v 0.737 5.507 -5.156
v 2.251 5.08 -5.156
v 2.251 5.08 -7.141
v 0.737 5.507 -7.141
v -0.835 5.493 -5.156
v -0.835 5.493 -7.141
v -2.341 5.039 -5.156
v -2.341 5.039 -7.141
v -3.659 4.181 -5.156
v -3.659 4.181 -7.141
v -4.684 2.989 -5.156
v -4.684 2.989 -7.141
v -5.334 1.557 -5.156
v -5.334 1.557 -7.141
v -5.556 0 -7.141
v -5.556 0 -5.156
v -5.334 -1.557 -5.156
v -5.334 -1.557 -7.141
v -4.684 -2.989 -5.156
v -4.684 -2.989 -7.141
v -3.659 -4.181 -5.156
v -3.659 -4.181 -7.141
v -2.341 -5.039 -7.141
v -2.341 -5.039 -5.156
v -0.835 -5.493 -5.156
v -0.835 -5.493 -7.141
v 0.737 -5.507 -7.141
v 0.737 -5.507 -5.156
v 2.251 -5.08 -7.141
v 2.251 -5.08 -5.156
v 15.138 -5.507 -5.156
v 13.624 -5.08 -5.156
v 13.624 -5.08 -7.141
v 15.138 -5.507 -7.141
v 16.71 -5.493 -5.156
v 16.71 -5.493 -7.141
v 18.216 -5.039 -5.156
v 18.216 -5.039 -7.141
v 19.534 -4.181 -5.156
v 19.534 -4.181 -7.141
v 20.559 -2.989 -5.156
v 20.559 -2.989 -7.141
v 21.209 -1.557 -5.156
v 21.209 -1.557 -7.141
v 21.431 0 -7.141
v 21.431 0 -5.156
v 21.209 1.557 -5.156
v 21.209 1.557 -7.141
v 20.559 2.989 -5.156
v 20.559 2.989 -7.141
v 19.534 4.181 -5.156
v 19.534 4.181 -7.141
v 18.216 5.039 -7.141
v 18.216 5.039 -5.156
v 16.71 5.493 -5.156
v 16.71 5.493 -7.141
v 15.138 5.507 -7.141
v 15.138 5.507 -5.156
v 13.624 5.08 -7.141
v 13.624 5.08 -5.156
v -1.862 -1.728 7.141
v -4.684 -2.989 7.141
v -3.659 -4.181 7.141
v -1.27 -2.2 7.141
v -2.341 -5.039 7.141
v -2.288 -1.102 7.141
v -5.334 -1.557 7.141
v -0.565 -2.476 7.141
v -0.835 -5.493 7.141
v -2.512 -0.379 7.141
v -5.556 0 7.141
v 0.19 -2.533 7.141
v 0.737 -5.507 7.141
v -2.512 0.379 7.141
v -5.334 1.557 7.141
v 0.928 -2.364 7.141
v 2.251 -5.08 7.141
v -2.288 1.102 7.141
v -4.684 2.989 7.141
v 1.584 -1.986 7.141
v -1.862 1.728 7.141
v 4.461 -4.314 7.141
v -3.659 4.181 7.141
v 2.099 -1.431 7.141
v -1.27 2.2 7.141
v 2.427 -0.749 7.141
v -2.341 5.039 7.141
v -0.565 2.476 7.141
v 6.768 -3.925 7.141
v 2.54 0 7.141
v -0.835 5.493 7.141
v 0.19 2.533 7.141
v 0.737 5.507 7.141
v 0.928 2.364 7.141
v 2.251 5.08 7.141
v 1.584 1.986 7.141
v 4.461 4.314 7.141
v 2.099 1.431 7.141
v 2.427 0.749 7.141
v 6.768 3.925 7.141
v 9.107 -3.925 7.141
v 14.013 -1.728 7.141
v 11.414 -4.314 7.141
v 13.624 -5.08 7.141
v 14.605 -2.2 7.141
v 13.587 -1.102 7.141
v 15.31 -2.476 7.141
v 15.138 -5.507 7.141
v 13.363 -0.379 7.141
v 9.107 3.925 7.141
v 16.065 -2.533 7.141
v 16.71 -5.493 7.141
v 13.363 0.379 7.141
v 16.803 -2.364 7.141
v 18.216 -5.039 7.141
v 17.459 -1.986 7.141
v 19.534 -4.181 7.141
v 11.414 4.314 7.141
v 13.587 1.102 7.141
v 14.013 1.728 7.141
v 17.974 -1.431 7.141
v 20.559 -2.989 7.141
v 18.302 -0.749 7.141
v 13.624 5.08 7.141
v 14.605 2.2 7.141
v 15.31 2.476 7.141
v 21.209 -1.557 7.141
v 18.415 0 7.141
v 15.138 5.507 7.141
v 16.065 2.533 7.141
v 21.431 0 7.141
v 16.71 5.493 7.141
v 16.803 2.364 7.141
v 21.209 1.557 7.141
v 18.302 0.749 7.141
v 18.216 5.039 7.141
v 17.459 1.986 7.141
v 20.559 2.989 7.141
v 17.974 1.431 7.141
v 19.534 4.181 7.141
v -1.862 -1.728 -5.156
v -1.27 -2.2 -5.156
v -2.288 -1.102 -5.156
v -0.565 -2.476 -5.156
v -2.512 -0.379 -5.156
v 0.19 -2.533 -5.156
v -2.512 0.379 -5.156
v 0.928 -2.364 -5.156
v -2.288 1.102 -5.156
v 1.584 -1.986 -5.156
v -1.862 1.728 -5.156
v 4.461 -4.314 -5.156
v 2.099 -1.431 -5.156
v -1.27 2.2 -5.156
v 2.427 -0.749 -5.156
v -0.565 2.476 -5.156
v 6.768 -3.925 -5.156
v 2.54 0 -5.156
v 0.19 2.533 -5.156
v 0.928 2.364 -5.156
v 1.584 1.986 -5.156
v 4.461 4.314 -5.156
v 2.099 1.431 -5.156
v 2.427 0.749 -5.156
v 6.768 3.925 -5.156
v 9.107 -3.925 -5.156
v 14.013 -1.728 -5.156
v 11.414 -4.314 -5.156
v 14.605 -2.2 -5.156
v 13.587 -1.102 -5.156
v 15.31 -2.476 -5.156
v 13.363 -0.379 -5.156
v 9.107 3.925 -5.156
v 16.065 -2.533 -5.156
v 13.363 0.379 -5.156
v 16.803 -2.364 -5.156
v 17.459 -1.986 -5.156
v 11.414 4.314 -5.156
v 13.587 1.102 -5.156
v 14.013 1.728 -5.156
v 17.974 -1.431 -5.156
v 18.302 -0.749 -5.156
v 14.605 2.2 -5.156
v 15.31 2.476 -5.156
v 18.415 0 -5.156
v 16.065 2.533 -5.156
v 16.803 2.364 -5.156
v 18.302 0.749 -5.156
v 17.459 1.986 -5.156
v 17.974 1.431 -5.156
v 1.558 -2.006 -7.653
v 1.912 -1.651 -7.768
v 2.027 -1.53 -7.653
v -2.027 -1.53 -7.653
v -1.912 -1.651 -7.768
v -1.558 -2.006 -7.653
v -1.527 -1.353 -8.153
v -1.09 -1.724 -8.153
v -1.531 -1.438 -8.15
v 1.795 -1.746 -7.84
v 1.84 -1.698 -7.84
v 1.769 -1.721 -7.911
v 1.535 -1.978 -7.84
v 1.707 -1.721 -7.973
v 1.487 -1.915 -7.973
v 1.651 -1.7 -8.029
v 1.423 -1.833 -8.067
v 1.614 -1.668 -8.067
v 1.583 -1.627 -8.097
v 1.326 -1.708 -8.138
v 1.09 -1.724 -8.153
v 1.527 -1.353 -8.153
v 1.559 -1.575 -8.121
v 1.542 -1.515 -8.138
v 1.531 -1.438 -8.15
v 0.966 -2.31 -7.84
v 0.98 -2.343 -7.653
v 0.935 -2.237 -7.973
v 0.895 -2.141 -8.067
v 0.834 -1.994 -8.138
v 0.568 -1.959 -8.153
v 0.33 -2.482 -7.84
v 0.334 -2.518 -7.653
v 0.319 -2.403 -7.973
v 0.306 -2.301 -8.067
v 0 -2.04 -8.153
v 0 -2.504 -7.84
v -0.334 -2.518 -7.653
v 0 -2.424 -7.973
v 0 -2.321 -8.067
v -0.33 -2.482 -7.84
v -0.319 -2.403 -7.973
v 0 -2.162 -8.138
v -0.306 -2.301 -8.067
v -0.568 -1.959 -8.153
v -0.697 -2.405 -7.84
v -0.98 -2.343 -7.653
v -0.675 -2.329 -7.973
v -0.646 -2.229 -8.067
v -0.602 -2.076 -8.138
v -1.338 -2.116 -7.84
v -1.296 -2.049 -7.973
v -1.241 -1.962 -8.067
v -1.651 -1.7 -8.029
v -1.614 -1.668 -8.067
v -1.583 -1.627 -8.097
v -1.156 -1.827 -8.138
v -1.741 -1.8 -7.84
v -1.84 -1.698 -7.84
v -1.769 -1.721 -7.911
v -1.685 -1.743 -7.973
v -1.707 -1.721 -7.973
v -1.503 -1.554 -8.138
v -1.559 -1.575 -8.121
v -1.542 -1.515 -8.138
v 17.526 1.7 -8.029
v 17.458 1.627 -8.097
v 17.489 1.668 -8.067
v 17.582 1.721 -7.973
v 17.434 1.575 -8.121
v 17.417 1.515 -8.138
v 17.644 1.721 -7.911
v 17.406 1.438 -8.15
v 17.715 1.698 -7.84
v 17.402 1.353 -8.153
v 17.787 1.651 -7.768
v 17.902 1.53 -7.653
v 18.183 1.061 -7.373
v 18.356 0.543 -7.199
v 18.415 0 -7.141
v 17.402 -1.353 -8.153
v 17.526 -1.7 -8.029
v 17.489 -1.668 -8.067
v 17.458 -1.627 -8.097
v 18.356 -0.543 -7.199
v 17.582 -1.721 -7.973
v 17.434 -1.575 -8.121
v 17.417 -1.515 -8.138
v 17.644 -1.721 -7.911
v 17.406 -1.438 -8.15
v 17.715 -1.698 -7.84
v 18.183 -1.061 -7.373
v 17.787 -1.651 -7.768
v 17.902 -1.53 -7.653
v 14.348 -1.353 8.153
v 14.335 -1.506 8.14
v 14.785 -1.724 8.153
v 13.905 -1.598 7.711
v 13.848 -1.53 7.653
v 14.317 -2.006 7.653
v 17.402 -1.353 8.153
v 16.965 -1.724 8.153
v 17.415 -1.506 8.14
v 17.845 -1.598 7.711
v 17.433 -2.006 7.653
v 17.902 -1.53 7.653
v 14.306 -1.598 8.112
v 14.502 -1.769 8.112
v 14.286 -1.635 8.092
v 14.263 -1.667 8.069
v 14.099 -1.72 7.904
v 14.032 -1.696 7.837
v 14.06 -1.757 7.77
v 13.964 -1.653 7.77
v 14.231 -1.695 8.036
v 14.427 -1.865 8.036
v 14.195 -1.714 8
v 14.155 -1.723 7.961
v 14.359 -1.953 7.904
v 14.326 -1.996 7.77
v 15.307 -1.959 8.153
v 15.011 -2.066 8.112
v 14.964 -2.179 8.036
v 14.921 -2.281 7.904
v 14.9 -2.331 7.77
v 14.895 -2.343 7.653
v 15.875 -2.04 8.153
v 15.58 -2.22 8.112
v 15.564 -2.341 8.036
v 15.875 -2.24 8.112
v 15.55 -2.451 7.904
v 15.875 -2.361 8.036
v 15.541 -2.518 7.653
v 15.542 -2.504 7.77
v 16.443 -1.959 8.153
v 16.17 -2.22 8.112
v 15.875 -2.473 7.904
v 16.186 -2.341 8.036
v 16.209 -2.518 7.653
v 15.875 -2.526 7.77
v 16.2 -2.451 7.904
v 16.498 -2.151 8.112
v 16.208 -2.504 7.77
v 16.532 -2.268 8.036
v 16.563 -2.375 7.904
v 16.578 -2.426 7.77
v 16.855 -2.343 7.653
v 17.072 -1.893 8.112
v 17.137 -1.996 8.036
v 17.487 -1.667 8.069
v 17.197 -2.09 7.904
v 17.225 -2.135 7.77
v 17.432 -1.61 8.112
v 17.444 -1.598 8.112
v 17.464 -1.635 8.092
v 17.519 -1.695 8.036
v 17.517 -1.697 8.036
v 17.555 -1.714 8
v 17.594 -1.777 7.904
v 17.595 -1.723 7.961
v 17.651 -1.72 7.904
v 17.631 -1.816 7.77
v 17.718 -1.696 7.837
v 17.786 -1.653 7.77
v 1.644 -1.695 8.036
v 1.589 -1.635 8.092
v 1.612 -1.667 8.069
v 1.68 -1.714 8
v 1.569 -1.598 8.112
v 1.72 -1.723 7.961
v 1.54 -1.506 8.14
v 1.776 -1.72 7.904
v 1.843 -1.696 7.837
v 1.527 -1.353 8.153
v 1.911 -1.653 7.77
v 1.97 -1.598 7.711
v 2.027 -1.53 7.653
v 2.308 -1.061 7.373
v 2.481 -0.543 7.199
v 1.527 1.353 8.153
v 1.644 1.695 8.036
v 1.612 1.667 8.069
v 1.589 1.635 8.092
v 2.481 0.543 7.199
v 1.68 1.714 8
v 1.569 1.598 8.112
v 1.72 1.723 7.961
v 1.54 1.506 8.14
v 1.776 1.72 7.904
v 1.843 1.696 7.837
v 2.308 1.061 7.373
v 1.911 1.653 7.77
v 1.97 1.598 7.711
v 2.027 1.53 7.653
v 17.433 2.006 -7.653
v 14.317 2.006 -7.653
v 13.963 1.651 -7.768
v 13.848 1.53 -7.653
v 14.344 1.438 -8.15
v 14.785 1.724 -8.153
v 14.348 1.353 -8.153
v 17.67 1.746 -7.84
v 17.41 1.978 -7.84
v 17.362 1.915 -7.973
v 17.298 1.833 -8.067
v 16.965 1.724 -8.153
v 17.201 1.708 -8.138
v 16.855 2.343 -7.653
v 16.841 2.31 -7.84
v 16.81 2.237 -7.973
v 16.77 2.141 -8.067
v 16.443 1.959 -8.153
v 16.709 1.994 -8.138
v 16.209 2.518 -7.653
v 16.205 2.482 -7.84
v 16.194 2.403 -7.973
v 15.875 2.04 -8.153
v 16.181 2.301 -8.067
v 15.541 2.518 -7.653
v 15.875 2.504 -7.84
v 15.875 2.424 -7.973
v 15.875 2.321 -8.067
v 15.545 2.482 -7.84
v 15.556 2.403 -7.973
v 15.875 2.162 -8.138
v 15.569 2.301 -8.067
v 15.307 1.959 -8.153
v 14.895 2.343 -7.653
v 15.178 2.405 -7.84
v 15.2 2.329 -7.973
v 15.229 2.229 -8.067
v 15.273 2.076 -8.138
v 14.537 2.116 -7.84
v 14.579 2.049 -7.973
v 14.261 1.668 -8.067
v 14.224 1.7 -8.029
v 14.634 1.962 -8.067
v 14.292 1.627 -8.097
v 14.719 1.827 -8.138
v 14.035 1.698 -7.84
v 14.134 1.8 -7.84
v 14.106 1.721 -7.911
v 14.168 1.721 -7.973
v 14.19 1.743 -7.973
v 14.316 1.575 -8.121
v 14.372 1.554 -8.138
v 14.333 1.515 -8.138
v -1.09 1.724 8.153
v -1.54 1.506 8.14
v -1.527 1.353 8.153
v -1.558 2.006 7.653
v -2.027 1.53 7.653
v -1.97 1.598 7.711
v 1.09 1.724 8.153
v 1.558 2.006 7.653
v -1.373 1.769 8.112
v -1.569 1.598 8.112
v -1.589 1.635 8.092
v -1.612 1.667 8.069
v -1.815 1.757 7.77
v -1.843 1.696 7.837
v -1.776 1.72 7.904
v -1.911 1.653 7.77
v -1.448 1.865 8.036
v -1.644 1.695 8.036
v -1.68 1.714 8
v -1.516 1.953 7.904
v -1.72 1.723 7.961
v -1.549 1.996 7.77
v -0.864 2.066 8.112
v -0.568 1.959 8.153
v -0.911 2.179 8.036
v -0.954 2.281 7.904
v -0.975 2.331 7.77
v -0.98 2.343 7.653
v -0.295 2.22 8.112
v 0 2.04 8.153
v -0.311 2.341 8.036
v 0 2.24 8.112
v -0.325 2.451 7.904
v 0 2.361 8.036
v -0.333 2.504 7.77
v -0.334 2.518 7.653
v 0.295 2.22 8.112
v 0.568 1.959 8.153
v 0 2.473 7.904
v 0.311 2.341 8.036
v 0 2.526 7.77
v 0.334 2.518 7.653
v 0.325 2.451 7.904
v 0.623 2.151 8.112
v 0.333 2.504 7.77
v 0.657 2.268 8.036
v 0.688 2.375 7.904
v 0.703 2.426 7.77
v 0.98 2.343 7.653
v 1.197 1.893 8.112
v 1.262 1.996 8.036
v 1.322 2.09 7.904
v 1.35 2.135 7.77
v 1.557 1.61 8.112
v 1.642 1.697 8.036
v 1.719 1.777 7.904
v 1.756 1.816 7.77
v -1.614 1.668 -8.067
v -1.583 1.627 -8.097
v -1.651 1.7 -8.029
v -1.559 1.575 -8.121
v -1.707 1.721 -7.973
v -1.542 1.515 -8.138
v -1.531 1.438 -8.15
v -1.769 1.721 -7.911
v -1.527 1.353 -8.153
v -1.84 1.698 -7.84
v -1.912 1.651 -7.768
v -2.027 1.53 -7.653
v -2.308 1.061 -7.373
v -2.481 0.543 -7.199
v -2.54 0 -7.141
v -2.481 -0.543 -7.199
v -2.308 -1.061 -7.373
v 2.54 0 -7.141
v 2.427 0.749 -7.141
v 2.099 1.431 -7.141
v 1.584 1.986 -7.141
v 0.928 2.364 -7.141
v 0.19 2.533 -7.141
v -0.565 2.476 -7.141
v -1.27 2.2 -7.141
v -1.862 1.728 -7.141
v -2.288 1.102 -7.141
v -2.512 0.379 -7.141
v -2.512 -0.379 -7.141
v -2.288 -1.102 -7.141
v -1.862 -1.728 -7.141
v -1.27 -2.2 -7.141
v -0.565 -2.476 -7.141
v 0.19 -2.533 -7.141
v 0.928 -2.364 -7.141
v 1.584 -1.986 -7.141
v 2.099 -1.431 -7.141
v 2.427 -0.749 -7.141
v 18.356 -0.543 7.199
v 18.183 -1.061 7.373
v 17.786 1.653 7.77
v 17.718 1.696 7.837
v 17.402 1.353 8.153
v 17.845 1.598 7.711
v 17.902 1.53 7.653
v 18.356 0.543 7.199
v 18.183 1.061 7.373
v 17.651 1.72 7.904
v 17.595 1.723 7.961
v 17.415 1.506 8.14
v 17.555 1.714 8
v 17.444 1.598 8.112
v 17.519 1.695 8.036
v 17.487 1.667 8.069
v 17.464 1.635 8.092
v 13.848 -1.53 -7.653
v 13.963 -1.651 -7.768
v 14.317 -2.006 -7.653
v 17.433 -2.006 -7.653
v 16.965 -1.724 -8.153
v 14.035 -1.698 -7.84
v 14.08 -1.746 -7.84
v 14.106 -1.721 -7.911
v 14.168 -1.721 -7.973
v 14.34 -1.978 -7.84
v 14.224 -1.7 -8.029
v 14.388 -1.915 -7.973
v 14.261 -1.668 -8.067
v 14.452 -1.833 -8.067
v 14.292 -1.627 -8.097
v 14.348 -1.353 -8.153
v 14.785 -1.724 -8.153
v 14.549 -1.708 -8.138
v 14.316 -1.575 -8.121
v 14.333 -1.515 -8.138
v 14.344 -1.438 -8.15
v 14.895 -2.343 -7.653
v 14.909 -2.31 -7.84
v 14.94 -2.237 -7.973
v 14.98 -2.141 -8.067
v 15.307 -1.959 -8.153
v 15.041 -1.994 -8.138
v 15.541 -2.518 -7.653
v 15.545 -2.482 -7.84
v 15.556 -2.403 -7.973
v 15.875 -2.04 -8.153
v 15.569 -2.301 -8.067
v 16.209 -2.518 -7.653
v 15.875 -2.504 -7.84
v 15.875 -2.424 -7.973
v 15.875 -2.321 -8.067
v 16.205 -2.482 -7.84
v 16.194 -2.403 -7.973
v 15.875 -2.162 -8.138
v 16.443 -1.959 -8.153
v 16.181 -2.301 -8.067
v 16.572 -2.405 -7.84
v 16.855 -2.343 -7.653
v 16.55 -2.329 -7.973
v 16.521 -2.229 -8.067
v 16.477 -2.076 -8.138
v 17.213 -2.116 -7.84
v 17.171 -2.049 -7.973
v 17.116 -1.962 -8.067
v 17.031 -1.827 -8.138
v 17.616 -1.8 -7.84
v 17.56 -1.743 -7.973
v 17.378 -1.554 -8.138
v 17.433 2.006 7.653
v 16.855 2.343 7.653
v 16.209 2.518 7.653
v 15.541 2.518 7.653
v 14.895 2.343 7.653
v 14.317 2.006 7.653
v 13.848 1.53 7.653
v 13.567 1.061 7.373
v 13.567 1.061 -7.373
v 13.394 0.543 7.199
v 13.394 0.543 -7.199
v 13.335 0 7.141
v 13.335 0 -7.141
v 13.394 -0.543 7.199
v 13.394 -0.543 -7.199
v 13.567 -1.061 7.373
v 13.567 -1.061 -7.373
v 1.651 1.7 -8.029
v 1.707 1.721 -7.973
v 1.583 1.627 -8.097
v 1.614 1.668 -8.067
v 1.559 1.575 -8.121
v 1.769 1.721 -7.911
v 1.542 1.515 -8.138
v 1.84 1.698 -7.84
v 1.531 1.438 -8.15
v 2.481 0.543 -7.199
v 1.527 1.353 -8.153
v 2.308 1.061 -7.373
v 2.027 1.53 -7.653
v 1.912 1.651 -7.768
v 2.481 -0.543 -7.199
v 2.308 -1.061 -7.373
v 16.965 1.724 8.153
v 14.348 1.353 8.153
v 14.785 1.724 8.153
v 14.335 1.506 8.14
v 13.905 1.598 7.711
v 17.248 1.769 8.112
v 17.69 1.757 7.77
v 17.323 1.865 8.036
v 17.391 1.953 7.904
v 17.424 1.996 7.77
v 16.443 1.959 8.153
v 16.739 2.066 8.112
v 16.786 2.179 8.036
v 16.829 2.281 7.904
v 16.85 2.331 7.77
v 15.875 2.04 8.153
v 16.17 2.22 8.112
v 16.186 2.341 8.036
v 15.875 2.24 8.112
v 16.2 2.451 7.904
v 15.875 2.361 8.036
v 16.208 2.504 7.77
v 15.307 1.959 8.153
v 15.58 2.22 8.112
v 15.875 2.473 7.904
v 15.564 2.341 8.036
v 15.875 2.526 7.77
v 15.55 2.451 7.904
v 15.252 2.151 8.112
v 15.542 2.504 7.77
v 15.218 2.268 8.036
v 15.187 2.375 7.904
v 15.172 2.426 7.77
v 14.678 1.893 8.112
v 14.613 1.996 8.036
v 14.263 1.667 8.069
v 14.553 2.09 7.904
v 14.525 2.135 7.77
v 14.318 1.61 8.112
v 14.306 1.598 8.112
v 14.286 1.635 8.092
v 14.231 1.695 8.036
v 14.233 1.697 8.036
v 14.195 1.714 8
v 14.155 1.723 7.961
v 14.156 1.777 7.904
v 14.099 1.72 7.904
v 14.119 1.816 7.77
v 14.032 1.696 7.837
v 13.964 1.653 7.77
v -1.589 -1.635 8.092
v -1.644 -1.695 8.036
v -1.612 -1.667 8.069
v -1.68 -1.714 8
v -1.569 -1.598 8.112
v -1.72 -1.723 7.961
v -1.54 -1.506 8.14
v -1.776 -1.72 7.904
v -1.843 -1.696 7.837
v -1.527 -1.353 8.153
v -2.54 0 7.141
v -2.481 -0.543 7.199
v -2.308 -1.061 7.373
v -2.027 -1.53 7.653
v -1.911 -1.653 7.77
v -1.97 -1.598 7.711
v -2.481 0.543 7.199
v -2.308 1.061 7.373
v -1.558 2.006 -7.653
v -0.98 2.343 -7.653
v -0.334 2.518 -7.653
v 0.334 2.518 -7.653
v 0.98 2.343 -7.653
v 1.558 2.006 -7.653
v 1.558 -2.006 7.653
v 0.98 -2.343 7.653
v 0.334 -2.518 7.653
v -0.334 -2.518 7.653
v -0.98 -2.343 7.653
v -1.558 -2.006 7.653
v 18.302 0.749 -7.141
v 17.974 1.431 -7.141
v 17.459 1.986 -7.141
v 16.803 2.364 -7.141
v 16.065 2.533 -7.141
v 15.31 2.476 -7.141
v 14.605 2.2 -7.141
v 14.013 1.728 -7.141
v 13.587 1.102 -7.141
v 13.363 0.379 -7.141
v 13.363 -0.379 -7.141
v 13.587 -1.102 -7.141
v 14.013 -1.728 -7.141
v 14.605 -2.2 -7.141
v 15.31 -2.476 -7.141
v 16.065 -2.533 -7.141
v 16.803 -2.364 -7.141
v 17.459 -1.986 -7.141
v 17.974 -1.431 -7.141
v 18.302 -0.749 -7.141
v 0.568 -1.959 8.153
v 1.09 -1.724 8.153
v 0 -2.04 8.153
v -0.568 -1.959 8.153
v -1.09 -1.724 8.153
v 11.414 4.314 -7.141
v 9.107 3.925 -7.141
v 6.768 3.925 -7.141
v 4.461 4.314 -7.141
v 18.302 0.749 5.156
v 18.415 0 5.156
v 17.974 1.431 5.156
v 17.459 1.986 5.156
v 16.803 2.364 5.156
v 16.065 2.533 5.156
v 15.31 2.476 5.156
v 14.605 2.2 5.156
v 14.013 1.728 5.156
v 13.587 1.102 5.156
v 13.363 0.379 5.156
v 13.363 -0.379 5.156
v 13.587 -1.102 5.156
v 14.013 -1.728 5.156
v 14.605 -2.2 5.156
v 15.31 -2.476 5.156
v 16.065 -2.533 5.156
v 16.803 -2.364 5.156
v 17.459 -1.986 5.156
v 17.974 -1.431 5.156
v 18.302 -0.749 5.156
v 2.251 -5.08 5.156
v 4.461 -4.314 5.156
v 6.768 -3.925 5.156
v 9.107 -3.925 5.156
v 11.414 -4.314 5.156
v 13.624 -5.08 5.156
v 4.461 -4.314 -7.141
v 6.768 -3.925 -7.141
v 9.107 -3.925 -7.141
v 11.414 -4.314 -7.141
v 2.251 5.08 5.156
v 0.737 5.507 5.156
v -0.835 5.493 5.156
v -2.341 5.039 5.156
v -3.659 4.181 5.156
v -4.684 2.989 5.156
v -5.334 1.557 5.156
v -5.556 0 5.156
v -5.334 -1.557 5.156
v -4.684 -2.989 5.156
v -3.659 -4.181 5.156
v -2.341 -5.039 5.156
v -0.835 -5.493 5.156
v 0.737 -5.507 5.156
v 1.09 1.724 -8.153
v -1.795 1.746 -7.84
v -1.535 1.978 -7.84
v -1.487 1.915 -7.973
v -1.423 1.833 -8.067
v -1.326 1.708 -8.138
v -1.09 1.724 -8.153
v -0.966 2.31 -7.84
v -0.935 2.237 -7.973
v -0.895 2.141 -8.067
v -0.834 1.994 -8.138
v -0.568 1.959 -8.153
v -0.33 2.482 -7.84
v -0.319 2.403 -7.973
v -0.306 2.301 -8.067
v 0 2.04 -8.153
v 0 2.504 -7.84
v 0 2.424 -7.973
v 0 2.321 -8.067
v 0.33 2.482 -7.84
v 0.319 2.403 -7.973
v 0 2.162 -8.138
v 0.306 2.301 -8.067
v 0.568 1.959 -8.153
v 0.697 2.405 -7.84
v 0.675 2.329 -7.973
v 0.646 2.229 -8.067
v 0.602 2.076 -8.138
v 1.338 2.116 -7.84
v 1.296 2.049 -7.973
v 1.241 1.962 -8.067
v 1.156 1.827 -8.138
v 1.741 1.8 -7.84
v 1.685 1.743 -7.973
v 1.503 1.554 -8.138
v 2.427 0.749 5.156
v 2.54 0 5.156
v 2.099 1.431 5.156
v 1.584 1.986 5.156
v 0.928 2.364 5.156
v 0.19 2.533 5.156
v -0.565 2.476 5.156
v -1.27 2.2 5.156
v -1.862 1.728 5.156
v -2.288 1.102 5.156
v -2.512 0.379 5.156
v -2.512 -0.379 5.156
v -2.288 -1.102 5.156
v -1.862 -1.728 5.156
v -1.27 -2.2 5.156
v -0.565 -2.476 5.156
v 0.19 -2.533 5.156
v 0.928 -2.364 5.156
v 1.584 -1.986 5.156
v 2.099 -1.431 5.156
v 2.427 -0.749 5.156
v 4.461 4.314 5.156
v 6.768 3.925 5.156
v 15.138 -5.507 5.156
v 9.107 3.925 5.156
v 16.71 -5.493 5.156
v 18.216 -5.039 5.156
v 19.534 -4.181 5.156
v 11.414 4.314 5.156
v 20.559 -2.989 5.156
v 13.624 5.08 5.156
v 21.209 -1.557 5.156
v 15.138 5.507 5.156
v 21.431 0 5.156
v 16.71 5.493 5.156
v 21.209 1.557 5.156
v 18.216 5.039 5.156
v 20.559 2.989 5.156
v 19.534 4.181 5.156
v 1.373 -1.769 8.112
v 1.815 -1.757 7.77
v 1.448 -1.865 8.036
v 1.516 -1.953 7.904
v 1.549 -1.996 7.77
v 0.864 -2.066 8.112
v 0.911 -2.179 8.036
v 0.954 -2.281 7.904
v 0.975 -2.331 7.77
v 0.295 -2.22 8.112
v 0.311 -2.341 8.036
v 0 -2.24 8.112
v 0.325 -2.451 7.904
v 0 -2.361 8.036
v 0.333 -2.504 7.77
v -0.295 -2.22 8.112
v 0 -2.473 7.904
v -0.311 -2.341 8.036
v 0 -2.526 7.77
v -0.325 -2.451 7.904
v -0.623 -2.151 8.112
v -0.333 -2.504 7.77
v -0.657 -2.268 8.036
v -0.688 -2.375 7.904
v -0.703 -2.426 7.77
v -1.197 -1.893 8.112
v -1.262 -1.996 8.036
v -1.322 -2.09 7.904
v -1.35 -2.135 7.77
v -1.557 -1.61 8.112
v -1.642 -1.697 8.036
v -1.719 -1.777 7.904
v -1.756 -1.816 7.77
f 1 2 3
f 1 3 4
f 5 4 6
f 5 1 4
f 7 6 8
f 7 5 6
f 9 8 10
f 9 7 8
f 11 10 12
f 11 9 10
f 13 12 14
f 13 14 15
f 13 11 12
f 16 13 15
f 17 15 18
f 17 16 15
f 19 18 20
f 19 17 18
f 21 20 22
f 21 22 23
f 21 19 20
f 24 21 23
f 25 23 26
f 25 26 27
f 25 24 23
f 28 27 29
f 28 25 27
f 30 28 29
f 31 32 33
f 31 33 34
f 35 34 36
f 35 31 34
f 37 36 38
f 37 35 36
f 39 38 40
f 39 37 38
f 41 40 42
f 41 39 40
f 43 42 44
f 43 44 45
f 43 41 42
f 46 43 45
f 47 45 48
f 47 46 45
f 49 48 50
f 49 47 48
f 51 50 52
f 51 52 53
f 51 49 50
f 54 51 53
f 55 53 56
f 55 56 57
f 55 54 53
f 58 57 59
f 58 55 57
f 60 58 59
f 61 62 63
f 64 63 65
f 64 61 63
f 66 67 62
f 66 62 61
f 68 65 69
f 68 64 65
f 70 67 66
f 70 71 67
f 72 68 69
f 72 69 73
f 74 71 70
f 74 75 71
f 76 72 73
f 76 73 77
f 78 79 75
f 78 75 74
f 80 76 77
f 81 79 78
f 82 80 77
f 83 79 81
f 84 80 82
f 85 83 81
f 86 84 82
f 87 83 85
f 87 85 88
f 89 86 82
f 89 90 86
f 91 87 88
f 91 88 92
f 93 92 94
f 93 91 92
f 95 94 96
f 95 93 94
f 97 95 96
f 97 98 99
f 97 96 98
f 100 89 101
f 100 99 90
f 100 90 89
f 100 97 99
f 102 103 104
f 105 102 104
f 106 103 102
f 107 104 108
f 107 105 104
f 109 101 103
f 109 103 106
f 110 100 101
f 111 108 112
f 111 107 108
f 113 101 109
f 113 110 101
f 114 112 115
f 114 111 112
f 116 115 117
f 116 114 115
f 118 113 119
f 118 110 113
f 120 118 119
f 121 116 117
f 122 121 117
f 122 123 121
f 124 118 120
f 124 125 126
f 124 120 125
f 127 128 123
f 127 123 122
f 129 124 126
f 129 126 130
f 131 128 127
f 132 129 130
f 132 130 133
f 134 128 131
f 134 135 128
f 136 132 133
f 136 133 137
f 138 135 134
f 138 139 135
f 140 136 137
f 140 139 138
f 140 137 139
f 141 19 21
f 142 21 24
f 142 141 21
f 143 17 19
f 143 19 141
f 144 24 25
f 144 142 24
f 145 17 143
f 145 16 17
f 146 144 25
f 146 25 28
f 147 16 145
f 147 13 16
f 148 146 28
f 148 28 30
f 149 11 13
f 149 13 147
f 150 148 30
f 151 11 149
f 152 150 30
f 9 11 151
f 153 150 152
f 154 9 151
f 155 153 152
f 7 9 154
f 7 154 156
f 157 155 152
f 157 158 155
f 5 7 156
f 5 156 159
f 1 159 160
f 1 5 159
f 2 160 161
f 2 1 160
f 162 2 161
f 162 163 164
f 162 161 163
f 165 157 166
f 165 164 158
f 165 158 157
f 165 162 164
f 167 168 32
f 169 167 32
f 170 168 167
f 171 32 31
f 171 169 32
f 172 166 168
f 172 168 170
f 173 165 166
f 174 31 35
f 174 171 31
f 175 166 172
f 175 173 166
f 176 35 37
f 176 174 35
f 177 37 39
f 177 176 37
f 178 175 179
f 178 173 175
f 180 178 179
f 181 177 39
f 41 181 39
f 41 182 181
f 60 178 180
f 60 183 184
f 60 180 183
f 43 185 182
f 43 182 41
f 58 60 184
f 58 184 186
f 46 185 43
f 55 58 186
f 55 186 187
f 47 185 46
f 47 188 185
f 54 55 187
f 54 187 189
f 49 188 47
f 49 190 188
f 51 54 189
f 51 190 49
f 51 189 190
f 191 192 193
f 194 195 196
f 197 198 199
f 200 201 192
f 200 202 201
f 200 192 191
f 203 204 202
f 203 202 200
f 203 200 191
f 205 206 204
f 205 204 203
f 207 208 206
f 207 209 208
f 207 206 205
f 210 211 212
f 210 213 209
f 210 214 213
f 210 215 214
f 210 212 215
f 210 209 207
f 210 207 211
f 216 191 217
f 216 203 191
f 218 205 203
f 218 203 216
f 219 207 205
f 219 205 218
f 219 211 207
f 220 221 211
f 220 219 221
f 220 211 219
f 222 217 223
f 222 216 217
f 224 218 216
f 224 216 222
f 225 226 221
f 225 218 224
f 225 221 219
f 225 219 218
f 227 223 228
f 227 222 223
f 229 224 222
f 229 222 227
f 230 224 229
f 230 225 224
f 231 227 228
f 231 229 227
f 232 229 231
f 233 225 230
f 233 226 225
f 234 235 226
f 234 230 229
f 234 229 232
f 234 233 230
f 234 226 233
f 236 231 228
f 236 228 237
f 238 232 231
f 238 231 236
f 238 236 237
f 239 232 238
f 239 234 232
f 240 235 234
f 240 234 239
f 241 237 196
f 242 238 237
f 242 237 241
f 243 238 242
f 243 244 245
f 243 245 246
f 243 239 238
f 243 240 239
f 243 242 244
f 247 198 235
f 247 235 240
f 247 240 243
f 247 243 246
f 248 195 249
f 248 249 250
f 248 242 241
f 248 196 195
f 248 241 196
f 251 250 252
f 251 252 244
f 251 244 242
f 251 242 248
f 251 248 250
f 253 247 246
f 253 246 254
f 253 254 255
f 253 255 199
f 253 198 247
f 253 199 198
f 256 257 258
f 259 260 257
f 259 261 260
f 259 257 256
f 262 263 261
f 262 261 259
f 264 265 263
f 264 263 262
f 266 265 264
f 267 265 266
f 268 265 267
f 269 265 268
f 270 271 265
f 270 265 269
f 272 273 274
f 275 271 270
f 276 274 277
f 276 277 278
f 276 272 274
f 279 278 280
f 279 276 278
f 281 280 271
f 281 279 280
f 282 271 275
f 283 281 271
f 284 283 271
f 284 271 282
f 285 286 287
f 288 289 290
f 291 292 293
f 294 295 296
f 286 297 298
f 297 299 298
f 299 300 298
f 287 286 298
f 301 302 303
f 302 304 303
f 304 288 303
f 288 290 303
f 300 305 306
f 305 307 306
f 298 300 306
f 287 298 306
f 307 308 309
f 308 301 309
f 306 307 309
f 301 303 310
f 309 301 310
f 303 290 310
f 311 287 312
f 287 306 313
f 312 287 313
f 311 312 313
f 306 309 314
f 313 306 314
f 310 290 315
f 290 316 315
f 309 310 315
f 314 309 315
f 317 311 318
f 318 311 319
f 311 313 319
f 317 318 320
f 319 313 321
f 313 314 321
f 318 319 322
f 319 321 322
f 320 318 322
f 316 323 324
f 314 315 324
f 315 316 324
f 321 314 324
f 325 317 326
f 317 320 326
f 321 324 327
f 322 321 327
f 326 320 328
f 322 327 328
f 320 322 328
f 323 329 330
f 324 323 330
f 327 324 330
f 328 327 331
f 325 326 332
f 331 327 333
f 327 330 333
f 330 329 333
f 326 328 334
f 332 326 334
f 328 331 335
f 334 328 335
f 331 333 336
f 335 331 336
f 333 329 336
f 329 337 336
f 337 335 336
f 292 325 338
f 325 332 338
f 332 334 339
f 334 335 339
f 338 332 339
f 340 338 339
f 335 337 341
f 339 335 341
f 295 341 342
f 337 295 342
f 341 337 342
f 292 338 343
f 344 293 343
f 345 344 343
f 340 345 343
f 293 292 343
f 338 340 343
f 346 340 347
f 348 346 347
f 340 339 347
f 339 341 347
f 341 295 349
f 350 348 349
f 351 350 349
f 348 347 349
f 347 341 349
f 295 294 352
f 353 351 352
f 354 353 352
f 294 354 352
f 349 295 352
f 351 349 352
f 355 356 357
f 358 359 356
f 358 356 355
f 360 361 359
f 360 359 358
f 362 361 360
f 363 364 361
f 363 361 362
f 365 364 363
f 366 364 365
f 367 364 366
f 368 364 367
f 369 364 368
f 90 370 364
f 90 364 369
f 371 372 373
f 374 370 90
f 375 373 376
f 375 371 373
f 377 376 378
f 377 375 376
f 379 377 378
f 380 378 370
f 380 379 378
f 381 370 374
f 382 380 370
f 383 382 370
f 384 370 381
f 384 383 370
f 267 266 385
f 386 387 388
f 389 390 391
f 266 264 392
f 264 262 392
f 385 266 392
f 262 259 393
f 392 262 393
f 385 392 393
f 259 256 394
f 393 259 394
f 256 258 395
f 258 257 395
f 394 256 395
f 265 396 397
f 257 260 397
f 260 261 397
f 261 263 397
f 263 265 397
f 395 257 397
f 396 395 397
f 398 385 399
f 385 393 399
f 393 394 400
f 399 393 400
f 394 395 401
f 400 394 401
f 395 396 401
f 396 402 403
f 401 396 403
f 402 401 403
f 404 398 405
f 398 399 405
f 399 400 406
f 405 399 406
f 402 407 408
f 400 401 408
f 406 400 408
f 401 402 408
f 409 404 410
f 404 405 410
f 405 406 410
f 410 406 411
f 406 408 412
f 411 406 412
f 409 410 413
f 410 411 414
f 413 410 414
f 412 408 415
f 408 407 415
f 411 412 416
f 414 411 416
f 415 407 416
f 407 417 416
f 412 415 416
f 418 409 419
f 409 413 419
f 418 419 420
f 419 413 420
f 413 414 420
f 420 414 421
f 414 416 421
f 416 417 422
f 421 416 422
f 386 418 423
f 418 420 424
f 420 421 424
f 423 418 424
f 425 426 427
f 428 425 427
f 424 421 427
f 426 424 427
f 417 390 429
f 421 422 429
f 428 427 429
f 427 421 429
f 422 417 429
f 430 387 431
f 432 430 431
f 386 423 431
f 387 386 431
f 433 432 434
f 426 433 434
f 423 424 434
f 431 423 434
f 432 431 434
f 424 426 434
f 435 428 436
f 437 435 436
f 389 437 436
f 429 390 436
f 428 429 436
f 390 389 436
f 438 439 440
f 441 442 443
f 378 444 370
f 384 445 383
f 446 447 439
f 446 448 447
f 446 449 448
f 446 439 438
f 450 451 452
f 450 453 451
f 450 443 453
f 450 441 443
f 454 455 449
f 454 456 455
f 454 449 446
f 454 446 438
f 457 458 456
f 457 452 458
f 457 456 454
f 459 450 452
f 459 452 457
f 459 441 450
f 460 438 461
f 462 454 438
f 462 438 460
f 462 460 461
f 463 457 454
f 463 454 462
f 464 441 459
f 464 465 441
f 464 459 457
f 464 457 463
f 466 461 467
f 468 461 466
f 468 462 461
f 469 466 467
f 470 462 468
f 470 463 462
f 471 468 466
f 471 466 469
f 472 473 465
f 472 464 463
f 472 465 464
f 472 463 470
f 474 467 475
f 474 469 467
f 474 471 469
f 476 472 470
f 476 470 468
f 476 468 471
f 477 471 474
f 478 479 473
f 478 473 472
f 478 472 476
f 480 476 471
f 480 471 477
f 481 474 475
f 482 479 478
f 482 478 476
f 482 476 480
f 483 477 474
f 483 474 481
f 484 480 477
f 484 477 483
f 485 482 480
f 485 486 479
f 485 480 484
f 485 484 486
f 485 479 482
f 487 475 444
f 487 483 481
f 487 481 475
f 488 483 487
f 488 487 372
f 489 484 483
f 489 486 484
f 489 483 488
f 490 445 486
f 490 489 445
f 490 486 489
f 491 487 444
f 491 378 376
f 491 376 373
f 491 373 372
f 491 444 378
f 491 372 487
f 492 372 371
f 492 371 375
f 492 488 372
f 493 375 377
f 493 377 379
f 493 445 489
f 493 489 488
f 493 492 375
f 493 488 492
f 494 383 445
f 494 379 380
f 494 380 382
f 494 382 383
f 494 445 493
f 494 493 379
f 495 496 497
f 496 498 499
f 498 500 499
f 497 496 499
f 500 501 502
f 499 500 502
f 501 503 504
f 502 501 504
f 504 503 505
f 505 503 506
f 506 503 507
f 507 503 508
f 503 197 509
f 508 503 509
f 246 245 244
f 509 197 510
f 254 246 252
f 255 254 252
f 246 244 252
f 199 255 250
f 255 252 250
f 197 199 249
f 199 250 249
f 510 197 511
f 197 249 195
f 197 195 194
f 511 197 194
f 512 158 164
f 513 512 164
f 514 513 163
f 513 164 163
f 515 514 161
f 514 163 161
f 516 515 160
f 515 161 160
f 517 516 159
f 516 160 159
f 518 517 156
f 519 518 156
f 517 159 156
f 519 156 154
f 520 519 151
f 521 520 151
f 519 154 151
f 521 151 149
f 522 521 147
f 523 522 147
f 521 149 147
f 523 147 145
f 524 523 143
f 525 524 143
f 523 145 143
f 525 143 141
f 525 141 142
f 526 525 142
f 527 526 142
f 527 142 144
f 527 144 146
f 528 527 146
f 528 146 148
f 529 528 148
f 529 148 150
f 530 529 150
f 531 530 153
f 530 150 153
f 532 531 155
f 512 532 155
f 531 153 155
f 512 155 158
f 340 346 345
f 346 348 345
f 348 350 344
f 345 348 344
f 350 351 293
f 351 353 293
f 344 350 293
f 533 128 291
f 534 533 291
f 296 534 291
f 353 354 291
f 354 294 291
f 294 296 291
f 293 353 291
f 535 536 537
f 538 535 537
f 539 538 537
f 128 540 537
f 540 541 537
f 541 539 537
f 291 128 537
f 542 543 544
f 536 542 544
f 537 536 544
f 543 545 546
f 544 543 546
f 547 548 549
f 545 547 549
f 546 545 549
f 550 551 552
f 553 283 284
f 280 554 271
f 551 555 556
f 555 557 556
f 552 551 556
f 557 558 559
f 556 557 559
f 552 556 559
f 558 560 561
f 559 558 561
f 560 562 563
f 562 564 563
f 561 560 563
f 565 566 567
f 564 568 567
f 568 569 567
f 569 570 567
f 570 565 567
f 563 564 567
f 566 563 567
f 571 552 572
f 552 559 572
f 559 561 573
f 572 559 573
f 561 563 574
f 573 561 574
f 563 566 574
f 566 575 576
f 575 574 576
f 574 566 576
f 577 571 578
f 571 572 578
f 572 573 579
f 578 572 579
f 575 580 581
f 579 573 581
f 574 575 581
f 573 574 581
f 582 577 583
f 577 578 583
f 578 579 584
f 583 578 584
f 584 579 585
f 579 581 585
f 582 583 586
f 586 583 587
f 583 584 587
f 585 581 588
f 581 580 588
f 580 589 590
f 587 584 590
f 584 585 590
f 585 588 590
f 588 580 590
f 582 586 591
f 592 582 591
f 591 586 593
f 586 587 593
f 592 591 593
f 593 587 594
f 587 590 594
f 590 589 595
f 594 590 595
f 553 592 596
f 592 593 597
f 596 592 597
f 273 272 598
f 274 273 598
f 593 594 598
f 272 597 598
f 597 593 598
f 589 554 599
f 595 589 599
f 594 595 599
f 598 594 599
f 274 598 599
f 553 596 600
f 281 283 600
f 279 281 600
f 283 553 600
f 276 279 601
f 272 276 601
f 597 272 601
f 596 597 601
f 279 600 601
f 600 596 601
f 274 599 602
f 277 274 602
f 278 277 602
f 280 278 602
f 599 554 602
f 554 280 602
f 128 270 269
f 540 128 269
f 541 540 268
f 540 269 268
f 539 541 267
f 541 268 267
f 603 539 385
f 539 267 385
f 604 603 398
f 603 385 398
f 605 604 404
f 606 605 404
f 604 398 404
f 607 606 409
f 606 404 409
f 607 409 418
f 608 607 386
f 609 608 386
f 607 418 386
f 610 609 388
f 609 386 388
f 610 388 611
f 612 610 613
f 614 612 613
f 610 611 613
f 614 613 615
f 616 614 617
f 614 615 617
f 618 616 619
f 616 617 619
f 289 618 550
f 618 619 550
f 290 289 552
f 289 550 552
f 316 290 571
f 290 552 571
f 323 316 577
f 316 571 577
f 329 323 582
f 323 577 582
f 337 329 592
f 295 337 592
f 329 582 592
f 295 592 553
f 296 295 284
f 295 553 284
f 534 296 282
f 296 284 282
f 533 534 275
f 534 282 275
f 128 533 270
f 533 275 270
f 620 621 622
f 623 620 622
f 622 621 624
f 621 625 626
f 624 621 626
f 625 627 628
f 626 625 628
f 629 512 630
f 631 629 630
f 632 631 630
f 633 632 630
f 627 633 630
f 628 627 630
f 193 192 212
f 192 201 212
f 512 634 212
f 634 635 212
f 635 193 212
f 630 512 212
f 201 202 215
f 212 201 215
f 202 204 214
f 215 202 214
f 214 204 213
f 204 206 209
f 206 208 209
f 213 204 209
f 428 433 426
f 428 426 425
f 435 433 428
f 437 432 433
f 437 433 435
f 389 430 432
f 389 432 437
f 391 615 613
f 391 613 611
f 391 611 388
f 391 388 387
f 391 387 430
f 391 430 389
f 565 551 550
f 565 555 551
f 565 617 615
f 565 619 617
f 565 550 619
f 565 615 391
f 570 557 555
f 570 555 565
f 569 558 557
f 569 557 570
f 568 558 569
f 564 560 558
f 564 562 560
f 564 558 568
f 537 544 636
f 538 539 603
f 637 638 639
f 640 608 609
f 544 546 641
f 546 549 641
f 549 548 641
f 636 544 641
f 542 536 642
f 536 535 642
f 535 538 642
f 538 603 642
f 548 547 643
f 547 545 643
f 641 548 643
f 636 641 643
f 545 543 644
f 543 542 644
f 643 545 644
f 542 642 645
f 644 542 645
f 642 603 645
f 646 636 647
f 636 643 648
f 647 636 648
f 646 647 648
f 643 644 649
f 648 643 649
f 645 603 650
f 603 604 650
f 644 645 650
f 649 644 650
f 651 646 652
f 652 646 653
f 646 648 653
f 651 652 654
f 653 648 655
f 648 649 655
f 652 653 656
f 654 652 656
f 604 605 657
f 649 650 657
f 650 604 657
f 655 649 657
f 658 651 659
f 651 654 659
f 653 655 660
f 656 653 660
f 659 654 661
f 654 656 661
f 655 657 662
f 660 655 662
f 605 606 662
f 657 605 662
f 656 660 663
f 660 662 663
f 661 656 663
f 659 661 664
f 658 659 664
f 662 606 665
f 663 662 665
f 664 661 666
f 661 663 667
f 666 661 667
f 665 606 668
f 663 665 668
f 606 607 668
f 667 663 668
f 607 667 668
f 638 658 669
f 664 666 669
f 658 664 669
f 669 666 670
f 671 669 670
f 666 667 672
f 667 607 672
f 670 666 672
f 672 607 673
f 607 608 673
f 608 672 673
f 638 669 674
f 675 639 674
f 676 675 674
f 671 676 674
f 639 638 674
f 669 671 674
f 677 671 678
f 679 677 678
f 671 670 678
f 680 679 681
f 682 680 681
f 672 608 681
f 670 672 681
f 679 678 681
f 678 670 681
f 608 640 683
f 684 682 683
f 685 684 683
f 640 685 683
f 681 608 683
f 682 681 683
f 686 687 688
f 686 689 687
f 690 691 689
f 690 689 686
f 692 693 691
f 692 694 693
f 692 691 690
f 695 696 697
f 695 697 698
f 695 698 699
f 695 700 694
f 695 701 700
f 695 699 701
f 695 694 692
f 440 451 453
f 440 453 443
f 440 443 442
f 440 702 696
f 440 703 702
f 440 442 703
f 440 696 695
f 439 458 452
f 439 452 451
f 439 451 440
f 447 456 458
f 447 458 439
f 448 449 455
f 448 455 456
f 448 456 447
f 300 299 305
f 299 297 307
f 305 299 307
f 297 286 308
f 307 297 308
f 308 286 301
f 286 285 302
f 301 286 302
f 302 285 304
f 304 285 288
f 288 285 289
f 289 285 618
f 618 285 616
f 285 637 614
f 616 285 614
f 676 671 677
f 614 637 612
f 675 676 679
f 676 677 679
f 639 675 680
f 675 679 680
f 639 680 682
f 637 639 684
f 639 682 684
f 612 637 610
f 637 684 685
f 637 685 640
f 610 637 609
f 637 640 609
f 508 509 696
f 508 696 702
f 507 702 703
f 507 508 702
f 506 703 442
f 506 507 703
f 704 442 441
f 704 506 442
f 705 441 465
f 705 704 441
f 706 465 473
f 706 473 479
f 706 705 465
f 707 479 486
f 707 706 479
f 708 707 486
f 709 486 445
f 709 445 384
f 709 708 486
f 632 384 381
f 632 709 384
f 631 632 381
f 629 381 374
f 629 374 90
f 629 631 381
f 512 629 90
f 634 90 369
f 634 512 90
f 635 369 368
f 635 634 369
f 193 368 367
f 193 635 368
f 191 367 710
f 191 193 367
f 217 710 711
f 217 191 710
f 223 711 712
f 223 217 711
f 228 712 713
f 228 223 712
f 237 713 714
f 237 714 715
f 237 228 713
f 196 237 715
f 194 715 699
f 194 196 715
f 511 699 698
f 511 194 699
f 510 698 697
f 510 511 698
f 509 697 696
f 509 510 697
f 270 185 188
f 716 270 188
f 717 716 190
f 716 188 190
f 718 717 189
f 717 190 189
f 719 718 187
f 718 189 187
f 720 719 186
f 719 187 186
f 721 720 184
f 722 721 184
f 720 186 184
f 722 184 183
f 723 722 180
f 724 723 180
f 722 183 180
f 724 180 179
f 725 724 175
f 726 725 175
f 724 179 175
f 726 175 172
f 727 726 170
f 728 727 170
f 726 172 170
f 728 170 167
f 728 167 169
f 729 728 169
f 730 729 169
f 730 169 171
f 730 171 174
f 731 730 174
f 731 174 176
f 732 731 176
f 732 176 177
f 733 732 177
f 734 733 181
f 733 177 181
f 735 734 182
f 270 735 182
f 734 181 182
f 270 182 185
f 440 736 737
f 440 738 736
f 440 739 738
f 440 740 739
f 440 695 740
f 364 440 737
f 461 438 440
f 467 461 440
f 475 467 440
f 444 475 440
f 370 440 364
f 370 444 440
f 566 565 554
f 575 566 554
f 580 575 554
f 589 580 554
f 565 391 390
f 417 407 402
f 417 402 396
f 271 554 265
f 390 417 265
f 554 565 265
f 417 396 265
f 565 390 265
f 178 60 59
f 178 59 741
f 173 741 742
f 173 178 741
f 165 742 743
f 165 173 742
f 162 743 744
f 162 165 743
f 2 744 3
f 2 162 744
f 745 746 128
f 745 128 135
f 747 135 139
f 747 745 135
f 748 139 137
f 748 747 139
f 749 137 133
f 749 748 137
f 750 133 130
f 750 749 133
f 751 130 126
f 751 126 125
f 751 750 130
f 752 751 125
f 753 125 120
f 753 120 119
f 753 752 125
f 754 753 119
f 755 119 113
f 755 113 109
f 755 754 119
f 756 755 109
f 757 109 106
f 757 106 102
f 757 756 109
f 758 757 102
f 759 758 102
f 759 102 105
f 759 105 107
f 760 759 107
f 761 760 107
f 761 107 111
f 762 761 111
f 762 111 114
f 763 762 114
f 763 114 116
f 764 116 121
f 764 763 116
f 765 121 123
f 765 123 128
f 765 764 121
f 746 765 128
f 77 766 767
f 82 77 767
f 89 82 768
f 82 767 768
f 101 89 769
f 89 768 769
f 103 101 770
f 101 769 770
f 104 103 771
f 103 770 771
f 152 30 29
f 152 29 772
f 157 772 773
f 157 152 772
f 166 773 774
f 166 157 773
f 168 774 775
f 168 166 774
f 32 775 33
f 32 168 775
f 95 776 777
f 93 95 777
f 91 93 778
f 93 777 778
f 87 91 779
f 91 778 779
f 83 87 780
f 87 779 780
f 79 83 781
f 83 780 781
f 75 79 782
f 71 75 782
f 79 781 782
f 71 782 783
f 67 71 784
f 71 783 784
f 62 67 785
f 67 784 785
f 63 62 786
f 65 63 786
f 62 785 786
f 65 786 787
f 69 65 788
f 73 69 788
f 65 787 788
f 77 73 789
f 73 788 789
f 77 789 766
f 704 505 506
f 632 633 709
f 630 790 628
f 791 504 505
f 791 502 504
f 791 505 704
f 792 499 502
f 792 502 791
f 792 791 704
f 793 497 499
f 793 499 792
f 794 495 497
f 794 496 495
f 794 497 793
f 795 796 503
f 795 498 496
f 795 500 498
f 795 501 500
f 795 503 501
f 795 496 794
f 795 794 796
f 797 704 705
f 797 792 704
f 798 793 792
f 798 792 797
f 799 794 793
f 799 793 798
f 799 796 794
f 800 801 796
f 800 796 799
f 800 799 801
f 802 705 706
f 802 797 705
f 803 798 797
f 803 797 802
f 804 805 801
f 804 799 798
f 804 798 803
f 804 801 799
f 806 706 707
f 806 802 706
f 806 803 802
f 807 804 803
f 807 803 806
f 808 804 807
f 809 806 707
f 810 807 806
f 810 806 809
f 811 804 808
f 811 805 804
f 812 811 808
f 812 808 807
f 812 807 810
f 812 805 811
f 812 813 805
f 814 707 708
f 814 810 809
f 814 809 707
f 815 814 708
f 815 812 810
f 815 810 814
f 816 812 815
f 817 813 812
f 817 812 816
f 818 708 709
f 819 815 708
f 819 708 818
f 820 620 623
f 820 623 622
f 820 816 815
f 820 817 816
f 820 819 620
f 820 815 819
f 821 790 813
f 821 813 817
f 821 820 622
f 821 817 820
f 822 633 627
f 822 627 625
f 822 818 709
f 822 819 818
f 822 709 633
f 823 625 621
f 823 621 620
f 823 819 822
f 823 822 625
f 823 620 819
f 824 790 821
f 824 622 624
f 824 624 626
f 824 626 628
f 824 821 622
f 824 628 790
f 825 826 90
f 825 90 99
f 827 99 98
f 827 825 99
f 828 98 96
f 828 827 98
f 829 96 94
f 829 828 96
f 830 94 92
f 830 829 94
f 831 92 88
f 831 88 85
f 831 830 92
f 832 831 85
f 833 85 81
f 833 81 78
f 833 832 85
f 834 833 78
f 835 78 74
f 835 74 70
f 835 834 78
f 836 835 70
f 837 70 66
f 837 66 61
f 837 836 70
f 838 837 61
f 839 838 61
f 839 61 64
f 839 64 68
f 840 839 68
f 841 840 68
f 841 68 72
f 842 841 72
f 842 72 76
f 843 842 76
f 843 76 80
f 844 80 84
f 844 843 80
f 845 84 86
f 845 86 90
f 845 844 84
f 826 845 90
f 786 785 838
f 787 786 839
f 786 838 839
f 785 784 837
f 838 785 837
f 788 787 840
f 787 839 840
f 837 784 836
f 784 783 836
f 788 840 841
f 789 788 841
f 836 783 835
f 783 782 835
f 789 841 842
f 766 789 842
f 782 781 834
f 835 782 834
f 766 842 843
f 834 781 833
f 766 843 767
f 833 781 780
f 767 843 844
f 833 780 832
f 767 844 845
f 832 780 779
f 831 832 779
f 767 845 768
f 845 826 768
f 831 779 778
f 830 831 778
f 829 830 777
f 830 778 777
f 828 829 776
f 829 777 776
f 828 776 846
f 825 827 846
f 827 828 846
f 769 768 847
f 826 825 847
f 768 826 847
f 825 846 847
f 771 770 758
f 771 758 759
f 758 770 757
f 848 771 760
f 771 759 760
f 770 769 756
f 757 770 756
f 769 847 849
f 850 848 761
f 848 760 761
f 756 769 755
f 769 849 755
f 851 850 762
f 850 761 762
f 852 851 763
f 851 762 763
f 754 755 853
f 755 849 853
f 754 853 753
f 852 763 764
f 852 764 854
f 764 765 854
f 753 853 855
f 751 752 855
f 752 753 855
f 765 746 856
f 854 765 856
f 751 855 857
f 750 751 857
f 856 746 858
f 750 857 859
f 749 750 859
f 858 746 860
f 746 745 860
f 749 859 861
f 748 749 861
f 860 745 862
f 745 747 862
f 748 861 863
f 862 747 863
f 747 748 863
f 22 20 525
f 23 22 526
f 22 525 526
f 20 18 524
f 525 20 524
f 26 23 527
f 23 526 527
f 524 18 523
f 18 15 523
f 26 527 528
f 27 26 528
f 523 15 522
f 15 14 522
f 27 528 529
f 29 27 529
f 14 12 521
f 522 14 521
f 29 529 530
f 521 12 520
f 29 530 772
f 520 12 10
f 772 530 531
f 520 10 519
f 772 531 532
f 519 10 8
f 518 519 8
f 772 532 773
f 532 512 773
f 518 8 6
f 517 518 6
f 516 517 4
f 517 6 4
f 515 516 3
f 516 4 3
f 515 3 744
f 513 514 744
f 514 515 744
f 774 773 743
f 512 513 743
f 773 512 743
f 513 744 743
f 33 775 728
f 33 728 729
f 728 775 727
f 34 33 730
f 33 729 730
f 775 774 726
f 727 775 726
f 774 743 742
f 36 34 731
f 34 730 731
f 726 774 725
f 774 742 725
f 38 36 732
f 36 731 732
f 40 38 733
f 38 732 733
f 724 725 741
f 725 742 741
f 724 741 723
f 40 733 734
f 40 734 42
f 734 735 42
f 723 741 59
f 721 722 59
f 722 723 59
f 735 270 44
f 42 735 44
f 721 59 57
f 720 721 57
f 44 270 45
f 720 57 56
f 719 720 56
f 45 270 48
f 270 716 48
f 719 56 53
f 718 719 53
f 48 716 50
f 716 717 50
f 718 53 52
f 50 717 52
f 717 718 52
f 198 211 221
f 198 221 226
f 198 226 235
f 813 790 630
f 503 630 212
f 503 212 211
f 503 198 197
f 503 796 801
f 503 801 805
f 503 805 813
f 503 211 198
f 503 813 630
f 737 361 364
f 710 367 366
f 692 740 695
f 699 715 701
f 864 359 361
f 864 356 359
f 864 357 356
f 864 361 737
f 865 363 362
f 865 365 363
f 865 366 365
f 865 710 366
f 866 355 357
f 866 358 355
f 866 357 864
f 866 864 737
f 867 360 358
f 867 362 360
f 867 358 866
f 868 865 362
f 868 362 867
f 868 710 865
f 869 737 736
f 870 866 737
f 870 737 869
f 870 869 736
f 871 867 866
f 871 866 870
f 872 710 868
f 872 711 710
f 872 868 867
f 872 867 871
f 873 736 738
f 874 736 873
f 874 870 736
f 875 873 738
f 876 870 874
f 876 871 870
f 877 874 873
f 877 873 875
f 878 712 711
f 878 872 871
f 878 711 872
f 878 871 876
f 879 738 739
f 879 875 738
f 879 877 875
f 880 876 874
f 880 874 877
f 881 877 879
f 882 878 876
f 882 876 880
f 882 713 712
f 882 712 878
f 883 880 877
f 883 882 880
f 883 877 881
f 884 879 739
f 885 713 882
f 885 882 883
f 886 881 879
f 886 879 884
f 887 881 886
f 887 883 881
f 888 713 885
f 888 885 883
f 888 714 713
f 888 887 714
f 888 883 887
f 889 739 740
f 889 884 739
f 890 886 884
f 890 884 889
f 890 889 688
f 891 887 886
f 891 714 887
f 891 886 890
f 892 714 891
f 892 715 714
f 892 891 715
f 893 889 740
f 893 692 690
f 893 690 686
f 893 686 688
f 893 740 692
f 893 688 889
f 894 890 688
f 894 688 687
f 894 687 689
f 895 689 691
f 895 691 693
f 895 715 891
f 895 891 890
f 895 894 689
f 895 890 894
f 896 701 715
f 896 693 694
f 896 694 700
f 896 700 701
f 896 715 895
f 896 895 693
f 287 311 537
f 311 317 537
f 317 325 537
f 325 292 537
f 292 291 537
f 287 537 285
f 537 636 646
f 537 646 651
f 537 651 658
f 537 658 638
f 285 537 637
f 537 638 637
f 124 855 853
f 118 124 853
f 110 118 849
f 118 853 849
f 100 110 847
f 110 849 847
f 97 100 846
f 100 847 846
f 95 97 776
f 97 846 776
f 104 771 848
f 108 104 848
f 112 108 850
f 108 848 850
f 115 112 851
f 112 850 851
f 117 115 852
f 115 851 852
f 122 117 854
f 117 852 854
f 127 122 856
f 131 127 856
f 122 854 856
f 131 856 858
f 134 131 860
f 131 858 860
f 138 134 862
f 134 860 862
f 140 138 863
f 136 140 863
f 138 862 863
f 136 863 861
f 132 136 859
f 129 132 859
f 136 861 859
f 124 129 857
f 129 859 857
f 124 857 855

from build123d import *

# Parameters (mm, degrees)
BOSS_EXTRUDE2_START     = 5.1562
SKETCH2_R               = 2.54
BOSS_EXTRUDE2_DEPTH     = 1.984375
CUT_EXTRUDE1_DEPTH      = 6.55625
CUT_EXTRUDE1_DEPTH_BACK = 6.55625


with BuildPart() as part:
    # Sketch1 → Revolve1 (revolve)
    with BuildSketch(Plane(origin=(0, 0, 0), x_dir=(1, 0, 0), z_dir=(0, 1, 0))):
        with BuildLine():
            Line((0, -8.1534), (-2.04, -8.1534))
            ThreePointArc((-2.04, -8.1534), (-2.393553391, -8.006953391), (-2.54, -7.6534))
            Line((-2.54, -7.6534), (-2.54, 7.6534))
            ThreePointArc((-2.54, 7.6534), (-2.393553391, 8.006953391), (-2.04, 8.1534))
            Line((-2.04, 8.1534), (0, 8.1534))
            Line((0, 8.1534), (0, -8.1534))
        make_face()
    revolve(axis=Axis((0, 0, 8.1534), (0, 0, -1)))

    # Sketch6 → Cut-Extrude1 (cut, two sides)
    with BuildSketch(Plane(origin=(0, 0, 0), x_dir=(1, 0, 0), z_dir=(0, 1, 0))) as cut_extrude1_sk:
        Polygon((1.527175, -8.1534), (2.54, -7.140575), (2.54, -9.1534), (-2.54, -9.1534), (-2.54, -7.140575), (-1.527175, -8.1534), align=None)
        Polygon((-2.54, 9.1534), (2.54, 9.1534), (2.54, 7.140575), (1.527175, 8.1534), (-1.527175, 8.1534), (-2.54, 7.140575), align=None)
    extrude(amount=CUT_EXTRUDE1_DEPTH, mode=Mode.SUBTRACT)
    extrude(cut_extrude1_sk.sketch, amount=-CUT_EXTRUDE1_DEPTH_BACK, mode=Mode.SUBTRACT)


with BuildPart() as body_2:
    # Sketch2 → Boss-Extrude2 (new body)
    with BuildSketch(Plane.XY.offset(BOSS_EXTRUDE2_START)):
        with BuildLine():
            ThreePointArc((2.250669692, 5.08), (-5.55625, 0), (2.250669692, -5.08))
            ThreePointArc((2.250669692, -5.08), (7.9375, -3.876645752), (13.624330308, -5.08))
            ThreePointArc((13.624330308, -5.08), (21.43125, 0), (13.624330308, 5.08))
            ThreePointArc((13.624330308, 5.08), (7.9375, 3.876645752), (2.250669692, 5.08))
        make_face()
        Circle(SKETCH2_R, mode=Mode.SUBTRACT)
        with Locations((15.875, 0)):
            Circle(SKETCH2_R, mode=Mode.SUBTRACT)
    extrude(amount=BOSS_EXTRUDE2_DEPTH)


with BuildPart() as body_3:
    # Mirror5: mirrored copy
    add(part.part.mirror(Plane(origin=(7.9375, 0, 0), x_dir=(0, 0, 1), z_dir=(1, 0, 0))))


with BuildPart() as body_4:
    # Mirror6: mirrored copy
    add(body_2.part.mirror(Plane.XY))


solid = Compound([part.part, body_2.part, body_3.part, body_4.part])
